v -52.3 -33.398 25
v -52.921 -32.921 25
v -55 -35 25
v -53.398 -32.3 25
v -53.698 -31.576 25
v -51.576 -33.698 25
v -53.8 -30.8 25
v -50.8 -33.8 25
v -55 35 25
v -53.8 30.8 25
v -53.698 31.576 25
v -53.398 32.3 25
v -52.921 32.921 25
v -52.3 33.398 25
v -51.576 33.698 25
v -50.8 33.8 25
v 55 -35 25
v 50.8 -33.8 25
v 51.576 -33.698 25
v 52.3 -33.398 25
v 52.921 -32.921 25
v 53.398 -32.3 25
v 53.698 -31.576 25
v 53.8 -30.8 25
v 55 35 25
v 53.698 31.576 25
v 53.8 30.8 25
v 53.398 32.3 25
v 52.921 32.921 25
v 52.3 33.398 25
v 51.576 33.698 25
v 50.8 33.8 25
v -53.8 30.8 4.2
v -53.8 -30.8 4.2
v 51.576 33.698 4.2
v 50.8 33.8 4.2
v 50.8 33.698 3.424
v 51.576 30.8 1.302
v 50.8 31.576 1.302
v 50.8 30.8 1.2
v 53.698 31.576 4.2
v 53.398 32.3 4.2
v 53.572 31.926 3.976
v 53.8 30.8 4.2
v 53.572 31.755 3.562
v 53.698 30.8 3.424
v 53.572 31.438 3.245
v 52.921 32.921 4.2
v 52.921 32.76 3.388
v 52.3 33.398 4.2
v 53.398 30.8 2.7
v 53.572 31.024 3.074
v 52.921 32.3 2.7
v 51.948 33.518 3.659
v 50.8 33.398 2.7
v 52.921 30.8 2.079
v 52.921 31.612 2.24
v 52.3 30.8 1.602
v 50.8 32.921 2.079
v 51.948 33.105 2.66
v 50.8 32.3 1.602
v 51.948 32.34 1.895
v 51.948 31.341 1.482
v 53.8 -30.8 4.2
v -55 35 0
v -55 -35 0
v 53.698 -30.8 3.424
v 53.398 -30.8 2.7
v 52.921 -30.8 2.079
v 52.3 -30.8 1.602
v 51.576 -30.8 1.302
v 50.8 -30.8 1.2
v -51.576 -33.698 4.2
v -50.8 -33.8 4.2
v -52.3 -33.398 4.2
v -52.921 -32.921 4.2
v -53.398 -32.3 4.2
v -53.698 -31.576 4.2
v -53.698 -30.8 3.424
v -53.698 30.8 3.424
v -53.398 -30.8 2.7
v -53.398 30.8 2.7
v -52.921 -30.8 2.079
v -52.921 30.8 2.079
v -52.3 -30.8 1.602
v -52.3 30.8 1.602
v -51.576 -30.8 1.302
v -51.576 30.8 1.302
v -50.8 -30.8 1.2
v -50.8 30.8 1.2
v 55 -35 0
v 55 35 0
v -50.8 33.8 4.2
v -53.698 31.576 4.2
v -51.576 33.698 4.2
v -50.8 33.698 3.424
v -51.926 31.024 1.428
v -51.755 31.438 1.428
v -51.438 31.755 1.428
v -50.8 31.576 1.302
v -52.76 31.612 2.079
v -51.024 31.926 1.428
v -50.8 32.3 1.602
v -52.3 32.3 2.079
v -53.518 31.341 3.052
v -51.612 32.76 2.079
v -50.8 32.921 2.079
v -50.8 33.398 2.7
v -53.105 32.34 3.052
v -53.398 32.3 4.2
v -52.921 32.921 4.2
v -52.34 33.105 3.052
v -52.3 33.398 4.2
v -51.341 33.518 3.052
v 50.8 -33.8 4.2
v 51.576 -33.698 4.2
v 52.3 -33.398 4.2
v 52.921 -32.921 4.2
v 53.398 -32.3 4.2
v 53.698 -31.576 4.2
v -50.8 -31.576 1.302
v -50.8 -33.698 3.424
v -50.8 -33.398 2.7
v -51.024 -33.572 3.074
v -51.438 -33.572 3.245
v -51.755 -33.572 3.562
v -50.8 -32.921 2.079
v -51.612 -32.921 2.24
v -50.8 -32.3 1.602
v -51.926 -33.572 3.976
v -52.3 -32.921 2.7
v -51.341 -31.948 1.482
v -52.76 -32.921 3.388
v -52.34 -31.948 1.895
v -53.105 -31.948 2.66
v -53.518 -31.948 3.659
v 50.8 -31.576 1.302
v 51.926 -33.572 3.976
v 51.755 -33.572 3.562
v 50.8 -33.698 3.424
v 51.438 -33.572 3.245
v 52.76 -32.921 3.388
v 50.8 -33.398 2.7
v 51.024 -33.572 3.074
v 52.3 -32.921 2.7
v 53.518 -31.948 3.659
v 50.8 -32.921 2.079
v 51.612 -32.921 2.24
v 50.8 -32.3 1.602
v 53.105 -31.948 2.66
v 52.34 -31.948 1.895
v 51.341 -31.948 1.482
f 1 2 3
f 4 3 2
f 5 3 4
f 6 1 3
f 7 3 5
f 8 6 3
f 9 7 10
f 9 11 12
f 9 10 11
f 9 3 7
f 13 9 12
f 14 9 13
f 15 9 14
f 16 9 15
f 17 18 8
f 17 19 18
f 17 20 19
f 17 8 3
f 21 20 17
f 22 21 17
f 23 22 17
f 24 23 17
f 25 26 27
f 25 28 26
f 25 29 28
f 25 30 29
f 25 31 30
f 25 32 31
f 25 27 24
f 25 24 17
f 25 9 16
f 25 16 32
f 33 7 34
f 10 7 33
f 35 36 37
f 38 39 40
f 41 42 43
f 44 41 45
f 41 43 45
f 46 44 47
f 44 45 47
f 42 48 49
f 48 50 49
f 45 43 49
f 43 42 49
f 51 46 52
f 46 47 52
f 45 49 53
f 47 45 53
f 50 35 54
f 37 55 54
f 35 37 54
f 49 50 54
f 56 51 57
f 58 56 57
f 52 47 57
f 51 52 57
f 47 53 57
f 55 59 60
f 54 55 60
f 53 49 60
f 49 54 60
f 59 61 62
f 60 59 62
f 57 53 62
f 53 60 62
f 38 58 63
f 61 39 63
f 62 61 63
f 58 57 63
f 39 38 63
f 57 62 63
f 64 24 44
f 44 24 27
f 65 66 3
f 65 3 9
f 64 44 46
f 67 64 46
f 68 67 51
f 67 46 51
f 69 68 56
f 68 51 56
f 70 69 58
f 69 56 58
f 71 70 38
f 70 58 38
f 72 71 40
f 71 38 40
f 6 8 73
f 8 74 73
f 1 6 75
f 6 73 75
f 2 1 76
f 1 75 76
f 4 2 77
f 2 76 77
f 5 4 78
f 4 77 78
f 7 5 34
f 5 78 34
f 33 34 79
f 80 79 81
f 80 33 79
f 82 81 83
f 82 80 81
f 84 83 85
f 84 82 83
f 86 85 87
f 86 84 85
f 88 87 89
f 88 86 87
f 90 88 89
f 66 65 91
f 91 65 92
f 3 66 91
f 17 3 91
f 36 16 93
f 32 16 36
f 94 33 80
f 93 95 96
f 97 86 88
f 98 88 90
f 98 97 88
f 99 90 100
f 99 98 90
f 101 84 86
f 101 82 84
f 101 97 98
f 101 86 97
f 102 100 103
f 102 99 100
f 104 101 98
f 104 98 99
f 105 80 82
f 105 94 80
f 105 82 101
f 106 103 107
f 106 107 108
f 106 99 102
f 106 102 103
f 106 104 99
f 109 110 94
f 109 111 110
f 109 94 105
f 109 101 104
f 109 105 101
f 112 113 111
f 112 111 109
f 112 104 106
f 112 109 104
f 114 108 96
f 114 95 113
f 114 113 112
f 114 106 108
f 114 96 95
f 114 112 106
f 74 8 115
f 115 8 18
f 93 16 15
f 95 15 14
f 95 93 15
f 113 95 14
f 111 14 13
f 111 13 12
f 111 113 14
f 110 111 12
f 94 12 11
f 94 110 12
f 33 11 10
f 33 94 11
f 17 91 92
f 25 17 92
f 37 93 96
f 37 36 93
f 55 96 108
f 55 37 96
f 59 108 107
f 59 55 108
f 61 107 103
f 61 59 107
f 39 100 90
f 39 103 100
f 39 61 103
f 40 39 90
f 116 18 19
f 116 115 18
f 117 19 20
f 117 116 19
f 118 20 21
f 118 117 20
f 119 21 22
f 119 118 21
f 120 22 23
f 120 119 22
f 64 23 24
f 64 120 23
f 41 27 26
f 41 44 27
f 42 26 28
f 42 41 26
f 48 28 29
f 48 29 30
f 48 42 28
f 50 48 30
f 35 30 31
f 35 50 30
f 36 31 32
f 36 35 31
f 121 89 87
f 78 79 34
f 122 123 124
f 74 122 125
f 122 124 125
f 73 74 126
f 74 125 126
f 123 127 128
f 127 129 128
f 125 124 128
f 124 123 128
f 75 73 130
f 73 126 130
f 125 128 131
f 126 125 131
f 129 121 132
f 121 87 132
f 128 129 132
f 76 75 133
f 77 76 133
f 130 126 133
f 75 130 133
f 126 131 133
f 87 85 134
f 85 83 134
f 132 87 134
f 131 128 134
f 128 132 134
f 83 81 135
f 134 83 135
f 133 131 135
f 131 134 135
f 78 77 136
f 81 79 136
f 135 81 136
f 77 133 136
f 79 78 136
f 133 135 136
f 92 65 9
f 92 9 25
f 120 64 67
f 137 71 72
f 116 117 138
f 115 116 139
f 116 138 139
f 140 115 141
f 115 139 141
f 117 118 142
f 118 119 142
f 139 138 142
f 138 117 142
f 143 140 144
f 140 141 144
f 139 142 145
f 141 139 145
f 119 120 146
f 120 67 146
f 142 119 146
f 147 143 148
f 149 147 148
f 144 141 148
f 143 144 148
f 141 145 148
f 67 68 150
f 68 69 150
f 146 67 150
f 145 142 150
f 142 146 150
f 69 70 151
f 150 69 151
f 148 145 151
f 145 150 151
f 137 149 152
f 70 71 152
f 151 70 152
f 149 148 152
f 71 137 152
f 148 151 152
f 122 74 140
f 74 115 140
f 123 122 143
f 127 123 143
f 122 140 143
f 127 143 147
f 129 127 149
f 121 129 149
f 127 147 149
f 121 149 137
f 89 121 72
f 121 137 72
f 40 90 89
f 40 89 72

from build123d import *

# Parameters (mm, degrees)
F0_W     = 110
F0_H     = 70
F1_DEPTH = 25
F2_W     = 107.6
F2_H     = 67.6
F3_DEPTH = 23.8
F4_R     = 3


with BuildPart() as f1:
    # F0 (on Top) → F1 (new body)
    with BuildSketch(Plane.XY):
        Rectangle(F0_W, F0_H)
    extrude(amount=F1_DEPTH)

    # F2 (on face) → F3 (cut)
    with BuildSketch(Plane.XY.offset(25)):
        Rectangle(F2_W, F2_H)
    extrude(amount=-F3_DEPTH, mode=Mode.SUBTRACT)

    # F4
    f4_edges = [f1.edges().sort_by_distance(p)[0] for p in [
        (-53.8, 33.8, 13.1),
        (-53.8, 0, 1.2),
        (0, 33.8, 1.2),
        (53.8, 33.8, 13.1),
        (53.8, 0, 1.2),
        (53.8, -33.8, 13.1),
        (0, -33.8, 1.2),
        (-53.8, -33.8, 13.1),
    ]]
    fillet(f4_edges, radius=F4_R)


solid = f1.part
